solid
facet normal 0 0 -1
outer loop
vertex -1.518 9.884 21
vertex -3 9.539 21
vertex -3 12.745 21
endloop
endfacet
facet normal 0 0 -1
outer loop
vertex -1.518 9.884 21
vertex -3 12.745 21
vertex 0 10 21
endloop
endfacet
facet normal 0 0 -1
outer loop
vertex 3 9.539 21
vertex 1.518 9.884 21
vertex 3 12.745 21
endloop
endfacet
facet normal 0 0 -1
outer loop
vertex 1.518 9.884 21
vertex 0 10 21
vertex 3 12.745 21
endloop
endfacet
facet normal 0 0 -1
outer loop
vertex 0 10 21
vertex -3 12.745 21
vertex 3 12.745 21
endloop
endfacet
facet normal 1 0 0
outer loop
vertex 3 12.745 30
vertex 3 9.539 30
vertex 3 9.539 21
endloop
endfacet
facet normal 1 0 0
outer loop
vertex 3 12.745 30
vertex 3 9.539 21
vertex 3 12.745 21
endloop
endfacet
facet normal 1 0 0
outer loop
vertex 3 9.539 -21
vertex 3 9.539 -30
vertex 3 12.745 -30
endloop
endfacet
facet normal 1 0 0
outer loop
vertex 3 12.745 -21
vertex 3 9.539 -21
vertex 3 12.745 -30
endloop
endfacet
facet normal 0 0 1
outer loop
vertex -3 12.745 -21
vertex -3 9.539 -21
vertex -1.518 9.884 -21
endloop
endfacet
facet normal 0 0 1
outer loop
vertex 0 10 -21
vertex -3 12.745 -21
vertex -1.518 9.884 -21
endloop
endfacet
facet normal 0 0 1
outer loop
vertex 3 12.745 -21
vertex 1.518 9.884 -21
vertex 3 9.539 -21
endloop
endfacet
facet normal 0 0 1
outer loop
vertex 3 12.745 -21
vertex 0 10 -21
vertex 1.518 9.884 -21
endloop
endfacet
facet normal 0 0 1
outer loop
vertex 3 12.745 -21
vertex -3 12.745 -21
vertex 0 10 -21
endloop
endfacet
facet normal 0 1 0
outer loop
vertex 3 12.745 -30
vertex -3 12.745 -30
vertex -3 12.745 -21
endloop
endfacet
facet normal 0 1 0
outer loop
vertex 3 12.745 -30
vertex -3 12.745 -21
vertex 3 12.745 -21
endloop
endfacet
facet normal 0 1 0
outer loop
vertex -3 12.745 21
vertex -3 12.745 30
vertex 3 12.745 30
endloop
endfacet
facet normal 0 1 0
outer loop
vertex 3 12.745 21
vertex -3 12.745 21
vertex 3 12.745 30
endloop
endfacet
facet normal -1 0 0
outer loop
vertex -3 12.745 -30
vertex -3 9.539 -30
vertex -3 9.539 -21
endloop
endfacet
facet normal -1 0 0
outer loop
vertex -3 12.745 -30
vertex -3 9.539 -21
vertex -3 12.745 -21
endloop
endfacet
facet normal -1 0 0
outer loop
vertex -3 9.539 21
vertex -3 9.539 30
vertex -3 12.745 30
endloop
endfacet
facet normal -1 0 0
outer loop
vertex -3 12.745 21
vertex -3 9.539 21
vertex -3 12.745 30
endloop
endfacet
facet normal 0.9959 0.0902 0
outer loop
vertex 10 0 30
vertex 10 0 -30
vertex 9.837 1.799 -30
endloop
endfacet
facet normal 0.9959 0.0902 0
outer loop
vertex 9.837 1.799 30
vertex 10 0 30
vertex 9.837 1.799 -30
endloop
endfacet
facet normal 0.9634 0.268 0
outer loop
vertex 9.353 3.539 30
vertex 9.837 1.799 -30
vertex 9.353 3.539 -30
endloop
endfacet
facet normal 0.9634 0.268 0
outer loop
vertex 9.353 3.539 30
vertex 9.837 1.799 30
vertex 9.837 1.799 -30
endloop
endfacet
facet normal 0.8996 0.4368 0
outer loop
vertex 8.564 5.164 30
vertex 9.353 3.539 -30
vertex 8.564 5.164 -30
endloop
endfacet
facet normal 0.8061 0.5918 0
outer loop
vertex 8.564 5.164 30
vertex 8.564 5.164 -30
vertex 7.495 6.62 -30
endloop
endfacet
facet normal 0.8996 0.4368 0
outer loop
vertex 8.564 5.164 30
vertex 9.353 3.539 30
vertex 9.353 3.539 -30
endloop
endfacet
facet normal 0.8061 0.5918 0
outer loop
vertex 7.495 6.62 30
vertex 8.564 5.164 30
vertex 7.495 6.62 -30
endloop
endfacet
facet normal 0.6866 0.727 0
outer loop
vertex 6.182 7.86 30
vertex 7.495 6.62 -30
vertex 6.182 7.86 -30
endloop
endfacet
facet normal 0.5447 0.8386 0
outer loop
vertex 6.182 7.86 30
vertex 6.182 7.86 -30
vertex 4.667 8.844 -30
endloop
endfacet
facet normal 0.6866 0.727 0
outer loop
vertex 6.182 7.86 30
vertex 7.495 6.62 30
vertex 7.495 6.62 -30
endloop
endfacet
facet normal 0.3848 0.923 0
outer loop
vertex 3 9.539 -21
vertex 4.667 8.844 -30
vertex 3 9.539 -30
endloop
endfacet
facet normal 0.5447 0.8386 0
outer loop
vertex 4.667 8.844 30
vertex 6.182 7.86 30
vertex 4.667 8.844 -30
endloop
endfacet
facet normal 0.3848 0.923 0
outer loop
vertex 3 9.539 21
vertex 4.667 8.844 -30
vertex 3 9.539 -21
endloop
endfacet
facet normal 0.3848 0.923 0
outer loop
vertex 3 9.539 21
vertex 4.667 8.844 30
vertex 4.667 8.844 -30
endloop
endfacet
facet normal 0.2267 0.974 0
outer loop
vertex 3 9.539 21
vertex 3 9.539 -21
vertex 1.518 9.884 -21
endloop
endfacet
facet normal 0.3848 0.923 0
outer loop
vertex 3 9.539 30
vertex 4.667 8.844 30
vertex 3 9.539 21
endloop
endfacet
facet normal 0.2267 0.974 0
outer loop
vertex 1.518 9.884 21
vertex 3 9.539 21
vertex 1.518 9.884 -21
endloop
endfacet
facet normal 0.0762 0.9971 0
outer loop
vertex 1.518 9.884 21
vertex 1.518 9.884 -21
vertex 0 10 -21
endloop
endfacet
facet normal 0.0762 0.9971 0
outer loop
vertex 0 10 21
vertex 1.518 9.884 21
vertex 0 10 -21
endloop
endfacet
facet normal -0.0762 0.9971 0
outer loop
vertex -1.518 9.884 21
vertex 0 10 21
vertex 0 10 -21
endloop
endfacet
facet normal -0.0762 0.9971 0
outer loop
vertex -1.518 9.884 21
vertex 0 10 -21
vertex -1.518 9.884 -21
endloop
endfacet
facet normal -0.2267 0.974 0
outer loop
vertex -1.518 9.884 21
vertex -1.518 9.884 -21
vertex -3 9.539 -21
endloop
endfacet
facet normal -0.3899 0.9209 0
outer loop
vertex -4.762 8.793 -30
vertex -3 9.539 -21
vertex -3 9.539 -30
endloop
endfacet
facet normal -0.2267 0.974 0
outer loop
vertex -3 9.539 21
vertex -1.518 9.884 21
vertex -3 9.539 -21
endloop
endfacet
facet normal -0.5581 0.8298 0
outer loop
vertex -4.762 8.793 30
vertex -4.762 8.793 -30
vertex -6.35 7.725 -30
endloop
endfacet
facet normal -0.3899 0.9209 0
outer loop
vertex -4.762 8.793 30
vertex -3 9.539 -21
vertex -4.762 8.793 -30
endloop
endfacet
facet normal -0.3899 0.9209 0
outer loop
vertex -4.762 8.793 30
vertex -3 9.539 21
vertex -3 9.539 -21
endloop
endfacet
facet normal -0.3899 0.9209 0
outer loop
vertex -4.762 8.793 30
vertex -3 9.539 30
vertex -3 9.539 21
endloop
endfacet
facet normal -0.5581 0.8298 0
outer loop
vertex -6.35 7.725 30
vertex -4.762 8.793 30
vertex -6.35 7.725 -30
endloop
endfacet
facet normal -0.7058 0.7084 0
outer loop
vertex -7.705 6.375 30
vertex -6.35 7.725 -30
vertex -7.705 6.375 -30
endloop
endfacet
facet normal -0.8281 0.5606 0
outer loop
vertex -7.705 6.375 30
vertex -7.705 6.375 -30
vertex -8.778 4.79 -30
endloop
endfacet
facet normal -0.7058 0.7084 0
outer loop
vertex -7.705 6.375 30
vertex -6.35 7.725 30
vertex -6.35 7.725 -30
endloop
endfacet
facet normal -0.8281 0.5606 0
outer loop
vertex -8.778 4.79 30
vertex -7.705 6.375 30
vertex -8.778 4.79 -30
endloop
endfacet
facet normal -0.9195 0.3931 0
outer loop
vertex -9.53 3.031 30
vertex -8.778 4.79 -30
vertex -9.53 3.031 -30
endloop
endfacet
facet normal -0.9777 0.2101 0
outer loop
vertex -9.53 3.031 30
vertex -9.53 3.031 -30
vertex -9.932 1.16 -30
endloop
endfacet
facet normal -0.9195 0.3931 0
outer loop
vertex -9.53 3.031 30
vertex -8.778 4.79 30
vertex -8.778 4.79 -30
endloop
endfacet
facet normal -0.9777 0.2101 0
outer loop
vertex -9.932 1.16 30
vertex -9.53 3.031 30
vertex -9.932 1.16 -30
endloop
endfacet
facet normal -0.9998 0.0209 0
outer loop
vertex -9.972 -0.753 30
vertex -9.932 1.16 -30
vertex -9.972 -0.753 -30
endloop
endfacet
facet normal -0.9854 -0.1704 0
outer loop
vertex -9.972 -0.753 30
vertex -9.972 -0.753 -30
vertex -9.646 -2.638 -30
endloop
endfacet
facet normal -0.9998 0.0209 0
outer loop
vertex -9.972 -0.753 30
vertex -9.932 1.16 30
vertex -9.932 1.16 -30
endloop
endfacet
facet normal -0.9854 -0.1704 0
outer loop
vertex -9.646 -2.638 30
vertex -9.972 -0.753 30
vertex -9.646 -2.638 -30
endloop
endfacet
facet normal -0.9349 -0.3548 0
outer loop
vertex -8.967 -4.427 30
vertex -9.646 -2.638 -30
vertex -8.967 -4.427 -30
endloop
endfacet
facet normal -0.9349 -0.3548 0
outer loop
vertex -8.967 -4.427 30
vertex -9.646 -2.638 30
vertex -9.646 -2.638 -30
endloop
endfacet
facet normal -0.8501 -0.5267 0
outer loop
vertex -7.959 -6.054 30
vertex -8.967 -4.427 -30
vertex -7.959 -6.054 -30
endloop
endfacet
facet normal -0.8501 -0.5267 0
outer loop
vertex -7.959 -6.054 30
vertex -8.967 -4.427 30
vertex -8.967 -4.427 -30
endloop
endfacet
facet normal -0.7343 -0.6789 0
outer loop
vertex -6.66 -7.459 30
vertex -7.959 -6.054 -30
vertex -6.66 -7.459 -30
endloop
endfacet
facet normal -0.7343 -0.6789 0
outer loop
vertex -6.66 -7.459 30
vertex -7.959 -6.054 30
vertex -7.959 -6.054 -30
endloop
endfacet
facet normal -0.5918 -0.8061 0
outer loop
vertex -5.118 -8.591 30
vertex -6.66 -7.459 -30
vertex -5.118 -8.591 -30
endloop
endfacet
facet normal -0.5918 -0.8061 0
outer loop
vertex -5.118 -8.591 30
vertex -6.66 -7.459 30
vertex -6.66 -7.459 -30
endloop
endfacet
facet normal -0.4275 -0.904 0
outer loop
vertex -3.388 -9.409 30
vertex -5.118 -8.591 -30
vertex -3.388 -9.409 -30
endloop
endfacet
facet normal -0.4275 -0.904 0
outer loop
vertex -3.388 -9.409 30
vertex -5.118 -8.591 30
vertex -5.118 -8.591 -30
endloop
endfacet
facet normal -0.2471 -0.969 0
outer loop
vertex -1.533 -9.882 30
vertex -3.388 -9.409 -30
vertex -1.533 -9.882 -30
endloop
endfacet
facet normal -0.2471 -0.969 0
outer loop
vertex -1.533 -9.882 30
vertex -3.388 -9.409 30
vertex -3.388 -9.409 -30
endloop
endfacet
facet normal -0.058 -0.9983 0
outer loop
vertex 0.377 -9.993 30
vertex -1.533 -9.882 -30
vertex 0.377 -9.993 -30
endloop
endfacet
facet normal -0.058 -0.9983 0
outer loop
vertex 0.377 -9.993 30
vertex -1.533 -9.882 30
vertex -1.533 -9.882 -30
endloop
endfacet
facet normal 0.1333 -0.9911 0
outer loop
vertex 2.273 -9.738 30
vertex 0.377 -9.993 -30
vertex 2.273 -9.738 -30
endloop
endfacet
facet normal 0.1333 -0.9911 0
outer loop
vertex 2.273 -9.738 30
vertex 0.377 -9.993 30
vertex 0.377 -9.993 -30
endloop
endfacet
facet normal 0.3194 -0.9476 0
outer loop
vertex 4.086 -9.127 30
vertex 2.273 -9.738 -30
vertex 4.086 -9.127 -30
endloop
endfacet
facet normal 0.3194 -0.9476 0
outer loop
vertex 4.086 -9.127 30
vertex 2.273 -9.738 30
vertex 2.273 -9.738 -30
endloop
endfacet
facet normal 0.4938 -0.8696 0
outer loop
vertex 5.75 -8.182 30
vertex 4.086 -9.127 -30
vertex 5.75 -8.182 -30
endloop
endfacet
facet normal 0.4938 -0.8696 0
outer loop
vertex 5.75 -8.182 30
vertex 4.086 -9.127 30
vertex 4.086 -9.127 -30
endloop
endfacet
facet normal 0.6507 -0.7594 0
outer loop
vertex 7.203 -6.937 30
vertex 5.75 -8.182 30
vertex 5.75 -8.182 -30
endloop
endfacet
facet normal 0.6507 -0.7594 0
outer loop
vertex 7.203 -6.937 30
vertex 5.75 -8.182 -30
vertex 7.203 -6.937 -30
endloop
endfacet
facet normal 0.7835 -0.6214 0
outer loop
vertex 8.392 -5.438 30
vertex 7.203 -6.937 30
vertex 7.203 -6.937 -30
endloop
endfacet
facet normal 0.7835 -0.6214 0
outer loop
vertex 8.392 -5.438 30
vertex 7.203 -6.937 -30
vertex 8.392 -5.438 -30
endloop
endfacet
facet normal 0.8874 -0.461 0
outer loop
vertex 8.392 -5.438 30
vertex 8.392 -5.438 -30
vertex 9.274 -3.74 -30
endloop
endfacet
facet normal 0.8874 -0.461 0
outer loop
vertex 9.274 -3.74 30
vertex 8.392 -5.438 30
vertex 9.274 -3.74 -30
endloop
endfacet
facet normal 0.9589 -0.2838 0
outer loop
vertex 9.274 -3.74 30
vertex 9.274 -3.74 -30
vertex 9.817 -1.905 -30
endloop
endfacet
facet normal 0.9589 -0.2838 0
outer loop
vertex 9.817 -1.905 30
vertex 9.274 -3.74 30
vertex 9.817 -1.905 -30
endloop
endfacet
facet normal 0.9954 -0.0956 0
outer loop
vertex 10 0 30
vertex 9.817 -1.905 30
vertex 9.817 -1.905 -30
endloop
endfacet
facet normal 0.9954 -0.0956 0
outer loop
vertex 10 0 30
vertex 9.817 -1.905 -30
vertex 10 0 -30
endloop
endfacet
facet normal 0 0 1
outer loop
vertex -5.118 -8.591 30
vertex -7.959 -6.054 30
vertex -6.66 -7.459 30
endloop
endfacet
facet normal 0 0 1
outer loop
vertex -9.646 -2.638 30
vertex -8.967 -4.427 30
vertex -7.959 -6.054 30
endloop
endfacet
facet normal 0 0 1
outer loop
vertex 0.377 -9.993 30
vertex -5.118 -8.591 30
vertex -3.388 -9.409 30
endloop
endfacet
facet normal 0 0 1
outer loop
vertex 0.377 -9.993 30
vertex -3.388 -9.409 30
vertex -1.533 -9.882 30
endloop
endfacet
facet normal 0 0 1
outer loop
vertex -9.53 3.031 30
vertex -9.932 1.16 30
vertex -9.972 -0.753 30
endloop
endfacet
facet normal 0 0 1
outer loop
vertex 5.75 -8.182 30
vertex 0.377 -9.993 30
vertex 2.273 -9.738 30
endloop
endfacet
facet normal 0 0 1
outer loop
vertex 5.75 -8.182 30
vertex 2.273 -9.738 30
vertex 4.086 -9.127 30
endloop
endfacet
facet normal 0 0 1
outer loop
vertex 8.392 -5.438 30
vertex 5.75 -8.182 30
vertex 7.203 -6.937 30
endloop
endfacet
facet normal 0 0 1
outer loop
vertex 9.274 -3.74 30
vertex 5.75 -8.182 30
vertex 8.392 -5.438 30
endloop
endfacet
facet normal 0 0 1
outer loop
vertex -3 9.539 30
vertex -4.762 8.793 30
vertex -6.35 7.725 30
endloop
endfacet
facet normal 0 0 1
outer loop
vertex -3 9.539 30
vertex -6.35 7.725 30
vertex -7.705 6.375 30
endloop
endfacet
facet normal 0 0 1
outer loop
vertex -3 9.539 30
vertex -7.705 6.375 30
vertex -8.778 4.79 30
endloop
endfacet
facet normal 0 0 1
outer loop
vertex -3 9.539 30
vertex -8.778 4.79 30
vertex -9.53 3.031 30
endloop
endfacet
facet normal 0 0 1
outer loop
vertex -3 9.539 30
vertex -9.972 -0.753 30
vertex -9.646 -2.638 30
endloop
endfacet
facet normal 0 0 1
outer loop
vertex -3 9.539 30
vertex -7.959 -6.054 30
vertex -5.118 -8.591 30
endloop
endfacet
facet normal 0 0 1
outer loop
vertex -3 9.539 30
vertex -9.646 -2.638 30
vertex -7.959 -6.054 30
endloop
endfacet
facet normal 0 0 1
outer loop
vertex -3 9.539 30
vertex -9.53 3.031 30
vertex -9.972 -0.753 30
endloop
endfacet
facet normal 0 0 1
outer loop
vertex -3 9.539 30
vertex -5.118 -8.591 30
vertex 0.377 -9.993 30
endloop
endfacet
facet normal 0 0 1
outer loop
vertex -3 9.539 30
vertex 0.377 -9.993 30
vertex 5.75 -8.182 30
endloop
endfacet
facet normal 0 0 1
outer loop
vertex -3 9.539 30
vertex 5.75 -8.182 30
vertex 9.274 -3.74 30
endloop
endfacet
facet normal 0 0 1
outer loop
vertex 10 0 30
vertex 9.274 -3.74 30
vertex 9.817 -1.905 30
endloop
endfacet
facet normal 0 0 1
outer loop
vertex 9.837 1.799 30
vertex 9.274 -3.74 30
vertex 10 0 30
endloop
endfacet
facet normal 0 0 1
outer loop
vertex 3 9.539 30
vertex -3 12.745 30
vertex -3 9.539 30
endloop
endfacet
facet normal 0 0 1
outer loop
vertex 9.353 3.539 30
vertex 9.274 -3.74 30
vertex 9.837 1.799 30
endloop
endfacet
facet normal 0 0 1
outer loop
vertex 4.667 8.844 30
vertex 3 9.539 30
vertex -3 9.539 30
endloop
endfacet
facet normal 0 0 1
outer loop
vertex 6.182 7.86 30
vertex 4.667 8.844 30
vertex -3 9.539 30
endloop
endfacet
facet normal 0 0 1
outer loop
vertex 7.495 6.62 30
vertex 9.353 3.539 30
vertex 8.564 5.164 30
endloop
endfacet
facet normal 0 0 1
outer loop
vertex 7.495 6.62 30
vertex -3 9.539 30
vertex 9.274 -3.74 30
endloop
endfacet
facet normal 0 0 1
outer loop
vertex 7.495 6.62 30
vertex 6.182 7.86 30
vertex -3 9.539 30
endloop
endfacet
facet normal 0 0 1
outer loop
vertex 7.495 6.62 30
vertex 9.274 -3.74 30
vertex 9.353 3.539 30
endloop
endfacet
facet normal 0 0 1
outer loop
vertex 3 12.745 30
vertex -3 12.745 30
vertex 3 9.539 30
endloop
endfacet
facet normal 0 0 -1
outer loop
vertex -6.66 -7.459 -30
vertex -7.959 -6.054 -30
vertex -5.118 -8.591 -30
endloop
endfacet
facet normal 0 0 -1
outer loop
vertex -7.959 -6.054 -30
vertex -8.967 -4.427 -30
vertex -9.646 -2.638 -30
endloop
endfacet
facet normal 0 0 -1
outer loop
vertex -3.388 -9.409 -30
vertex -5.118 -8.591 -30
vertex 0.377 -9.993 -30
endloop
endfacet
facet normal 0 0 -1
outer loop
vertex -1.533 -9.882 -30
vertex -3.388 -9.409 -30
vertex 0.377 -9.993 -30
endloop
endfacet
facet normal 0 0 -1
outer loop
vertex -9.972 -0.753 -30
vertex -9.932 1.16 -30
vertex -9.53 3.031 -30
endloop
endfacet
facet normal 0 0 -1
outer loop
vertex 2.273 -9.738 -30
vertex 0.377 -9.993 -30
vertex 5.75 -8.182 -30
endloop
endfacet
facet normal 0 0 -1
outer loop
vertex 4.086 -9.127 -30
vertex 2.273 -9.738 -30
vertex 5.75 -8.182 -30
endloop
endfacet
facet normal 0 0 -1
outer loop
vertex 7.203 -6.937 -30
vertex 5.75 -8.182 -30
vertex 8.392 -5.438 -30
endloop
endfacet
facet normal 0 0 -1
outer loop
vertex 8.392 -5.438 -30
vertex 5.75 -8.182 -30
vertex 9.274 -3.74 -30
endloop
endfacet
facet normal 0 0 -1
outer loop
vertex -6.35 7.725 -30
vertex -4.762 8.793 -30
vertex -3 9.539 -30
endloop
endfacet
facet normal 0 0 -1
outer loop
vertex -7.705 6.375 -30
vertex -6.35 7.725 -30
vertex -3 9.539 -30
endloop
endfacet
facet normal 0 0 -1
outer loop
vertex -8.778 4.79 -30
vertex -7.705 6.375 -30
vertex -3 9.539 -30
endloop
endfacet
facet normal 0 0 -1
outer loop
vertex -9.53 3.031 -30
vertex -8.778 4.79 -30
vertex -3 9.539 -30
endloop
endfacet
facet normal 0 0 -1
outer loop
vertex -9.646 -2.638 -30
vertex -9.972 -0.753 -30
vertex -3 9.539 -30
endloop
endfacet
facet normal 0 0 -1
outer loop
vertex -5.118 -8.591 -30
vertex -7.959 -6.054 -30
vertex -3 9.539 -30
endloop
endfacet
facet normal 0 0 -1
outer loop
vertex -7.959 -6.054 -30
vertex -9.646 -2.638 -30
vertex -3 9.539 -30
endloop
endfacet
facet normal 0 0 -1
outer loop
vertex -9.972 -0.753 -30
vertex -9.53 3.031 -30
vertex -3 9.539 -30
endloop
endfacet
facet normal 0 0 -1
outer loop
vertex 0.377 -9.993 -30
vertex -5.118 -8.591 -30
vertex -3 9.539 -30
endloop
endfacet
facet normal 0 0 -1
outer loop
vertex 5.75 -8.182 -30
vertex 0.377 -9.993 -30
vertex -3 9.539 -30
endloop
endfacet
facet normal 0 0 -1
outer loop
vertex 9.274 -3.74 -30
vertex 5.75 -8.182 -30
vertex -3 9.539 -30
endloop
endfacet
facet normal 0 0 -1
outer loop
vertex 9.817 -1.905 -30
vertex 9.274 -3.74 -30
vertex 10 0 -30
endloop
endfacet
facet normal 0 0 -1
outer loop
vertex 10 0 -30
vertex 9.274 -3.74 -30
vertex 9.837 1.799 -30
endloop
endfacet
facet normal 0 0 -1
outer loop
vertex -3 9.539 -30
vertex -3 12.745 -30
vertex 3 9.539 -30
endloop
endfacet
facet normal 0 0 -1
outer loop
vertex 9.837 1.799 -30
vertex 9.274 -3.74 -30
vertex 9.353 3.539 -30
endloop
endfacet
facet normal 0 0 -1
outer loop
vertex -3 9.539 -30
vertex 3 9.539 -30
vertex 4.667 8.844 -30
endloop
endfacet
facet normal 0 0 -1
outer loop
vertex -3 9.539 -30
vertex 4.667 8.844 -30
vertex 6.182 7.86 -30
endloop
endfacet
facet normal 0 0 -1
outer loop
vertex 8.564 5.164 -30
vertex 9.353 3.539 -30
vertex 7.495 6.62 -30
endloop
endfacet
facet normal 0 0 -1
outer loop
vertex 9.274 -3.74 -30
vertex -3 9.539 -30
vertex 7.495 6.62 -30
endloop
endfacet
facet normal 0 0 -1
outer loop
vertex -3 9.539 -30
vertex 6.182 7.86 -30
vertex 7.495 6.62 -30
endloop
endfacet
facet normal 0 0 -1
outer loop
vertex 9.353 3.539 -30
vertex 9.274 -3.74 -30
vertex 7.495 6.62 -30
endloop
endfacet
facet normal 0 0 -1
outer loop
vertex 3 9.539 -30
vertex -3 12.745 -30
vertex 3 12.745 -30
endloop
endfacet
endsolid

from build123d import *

# Parameters (mm, degrees)
SKETCH1_R           = 10
BOSS_EXTRUDE1_DEPTH = 30
SKETCH2_W           = 6
SKETCH2_H           = 3.26
BOSS_EXTRUDE2_DEPTH = 9


with BuildPart() as part:
    # Sketch1 → Boss-Extrude1 (new body, symmetric)
    with BuildSketch(Plane.XY):
        Circle(SKETCH1_R)
    extrude(amount=BOSS_EXTRUDE1_DEPTH, both=True)

    # Sketch2 → Boss-Extrude2 (add)
    with BuildSketch(Plane.XY.offset(30)):
        with Locations((0, 11.115019423)):
            Rectangle(SKETCH2_W, SKETCH2_H)
    boss_extrude2 = extrude(amount=-BOSS_EXTRUDE2_DEPTH)

    # Mirror1: Boss-Extrude2 across plane
    add(boss_extrude2.mirror(Plane.XY))


solid = part.part
